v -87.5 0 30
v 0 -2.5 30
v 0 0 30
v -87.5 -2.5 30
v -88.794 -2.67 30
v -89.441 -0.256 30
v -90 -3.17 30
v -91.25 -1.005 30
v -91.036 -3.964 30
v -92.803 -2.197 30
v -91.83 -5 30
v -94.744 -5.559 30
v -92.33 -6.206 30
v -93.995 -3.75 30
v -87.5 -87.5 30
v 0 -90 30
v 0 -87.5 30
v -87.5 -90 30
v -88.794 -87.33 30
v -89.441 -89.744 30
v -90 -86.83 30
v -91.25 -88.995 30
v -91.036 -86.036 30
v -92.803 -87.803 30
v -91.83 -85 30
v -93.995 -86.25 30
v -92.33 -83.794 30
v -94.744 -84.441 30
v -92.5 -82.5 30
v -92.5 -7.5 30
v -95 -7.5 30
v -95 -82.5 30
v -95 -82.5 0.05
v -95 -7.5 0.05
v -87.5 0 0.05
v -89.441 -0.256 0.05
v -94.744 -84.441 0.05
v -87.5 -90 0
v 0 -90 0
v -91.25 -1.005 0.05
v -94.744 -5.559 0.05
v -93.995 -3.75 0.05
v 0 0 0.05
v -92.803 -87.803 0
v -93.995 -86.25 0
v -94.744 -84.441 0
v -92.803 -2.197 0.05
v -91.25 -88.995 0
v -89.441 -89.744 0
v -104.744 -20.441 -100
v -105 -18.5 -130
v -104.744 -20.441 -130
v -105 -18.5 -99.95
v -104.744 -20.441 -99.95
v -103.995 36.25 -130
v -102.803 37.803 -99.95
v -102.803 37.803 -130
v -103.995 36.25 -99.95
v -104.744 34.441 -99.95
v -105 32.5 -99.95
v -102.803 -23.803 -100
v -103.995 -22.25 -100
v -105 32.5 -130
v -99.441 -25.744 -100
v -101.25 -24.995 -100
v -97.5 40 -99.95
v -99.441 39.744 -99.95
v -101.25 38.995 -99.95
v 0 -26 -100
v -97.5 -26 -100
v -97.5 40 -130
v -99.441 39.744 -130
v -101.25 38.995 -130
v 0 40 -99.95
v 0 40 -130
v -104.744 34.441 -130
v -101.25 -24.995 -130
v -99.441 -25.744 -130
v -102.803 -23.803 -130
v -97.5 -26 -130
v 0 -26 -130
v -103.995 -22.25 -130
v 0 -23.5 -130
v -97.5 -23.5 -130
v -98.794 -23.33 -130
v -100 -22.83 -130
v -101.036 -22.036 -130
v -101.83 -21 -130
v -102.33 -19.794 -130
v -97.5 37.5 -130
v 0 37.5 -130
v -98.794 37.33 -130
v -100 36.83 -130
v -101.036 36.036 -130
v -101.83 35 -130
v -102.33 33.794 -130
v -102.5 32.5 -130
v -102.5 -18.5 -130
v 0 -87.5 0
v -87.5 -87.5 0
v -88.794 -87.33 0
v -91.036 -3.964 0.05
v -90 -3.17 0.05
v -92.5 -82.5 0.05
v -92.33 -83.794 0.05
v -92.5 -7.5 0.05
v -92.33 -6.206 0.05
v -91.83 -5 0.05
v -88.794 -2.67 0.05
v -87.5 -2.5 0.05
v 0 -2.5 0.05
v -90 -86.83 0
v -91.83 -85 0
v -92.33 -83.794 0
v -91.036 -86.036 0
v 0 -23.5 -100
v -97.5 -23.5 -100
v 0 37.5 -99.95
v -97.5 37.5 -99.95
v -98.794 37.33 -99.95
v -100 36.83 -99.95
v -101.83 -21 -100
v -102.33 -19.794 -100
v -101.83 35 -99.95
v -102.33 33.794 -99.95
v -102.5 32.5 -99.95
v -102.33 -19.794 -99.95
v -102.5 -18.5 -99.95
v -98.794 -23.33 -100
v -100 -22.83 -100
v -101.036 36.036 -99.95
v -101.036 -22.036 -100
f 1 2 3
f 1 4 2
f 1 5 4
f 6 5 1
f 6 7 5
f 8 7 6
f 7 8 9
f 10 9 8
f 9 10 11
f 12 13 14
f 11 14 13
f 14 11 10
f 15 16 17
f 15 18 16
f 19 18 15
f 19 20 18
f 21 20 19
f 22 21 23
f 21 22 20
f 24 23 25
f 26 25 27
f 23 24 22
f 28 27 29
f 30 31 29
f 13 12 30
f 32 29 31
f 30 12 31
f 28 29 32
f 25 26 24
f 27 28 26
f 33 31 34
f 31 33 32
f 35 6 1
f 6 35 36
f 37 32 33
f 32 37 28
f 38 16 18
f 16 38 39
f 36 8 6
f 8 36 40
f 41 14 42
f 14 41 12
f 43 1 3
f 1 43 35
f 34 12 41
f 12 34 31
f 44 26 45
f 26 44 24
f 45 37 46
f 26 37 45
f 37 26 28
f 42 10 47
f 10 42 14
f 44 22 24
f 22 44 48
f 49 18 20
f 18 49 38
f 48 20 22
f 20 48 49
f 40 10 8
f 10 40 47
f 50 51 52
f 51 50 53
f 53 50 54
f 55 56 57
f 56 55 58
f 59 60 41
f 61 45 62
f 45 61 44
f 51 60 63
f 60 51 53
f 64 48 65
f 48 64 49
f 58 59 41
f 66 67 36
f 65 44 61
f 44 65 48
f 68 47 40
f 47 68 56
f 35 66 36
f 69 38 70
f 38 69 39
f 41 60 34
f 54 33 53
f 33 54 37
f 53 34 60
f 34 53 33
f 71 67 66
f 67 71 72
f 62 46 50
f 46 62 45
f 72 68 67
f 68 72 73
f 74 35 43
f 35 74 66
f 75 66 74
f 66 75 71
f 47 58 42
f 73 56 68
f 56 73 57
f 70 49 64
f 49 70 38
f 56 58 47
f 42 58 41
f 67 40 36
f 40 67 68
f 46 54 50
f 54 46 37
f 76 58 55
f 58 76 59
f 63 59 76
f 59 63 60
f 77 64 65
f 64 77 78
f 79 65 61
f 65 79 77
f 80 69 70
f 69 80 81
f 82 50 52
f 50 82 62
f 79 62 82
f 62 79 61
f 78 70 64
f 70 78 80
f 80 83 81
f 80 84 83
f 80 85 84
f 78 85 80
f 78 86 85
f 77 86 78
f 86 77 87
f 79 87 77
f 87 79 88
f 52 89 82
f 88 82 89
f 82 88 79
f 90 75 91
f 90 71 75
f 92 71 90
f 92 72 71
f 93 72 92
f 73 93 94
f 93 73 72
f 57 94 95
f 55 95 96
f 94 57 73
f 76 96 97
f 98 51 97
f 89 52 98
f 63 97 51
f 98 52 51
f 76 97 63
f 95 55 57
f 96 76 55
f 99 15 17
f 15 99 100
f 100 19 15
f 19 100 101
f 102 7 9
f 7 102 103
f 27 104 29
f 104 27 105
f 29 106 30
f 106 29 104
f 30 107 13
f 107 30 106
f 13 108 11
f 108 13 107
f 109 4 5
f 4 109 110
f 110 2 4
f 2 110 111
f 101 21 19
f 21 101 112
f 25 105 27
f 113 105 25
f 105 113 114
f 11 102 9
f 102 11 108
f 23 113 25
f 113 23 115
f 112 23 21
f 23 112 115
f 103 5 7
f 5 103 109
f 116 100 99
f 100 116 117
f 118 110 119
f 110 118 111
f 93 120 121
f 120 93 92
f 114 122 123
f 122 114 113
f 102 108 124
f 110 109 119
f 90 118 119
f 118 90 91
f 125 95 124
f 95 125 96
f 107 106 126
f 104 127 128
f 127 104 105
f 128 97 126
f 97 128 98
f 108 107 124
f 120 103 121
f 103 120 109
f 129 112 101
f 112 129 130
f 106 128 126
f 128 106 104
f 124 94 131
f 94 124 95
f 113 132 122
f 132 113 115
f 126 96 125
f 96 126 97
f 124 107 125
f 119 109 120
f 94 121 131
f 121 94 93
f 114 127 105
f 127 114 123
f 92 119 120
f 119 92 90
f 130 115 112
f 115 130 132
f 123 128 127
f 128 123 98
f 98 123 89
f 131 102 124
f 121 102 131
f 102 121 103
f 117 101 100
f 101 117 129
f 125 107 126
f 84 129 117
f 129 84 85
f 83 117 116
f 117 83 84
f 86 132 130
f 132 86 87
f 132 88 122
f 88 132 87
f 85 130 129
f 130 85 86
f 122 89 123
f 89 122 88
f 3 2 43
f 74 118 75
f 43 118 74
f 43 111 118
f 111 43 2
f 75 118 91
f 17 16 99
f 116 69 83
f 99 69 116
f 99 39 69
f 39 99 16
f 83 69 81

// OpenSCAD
// file: ../OpenSCAD_Modules/cube_vround.scad
module cube_vround(
	size=[10,10,10],
	round_corners=[true,true,true,true],
	rounding=3,
	center_xy=false,
	center_z=false,
	attach=0,
	wall_attach=0,
	quality=2, //integer from 1 to infinity
)
{
	assert(len(size)==3);
	assert(len(round_corners)==4);
	assert(rounding>0);
	assert(rounding<=size[0]/2);
	assert(rounding<=size[1]/2);
	assert(quality>0);
	assert(attach>=0);
	assert(wall_attach>=0);
	height=size[2]+attach;
	cyl_r=rounding+wall_attach;
	cyl_mvx=size[0]/2-rounding;
	cyl_mvy=size[1]/2-rounding;
	cube_szx=size[0]/2;
	cube_szy=size[1]/2;
	cube_mvx=cube_szx/2+wall_attach;
	cube_mvy=cube_szy/2+wall_attach;
	translate([center_xy?0:cube_szx,center_xy?0:cube_szy,center_z?-attach/2:(size[2]-attach)/2])
		hull()
		{
			if(round_corners[0])
				translate([cyl_mvx,cyl_mvy])
					cylinder(r=cyl_r,h=height,$fn=12*quality,center=true);
			else
				translate([cube_mvx,cube_mvy])
					cube([cube_szx,cube_szy,height],center=true);
			if(round_corners[1])
				translate([cyl_mvx,-cyl_mvy])
					cylinder(r=cyl_r,h=height,$fn=12*quality,center=true);
			else
				translate([cube_mvx,-cube_mvy])
					cube([cube_szx,cube_szy,height],center=true);
			if(round_corners[2])
				translate([-cyl_mvx,-cyl_mvy])
					cylinder(r=cyl_r,h=height,$fn=12*quality,center=true);
			else
				translate([-cube_mvx,-cube_mvy])
					cube([cube_szx,cube_szy,height],center=true);
			if(round_corners[3])
				translate([-cyl_mvx,cyl_mvy])
					cylinder(r=cyl_r,h=height,$fn=12*quality,center=true);
			else
				translate([-cube_mvx,cube_mvy])
					cube([cube_szx,cube_szy,height],center=true);
		};
}

//example
cube_vround(round_corners=[true,false,true,false],
size=[10,20,6],
attach=0.1,
wall_attach=0.1,
rounding=3,
center_xy=true,center_z=false);
// main file
use <../OpenSCAD_Modules/cube_vround.scad>

module Plate
(
	wallSz=2.5,
	backExtSize=[190,90,30],
	interfaceShift=[0,40,100],
	frontExtSize=[204+(2*2.5)+1,60+(2*2.5)+1,30],
	extRounding=5+2.5,
)
{
	cutClr=0.05;
	difference()
	{
		union()
		{
			//back part
			translate([0,-backExtSize[1]/2,0])
			cube_vround(size=[backExtSize[0],backExtSize[1],backExtSize[2]],rounding=extRounding, center_xy=true);

			//interface back (top) to front (bottom)
			hull()
			{
				translate([0,-backExtSize[1]/2,0])
				cube_vround(size=[backExtSize[0],backExtSize[1],cutClr],rounding=extRounding,center_xy=true);

				translate([interfaceShift[0],interfaceShift[1]-frontExtSize[1]/2,-interfaceShift[2]])
				cube_vround(size=[frontExtSize[0],frontExtSize[1],cutClr],rounding=extRounding,center_xy=true);
			}

			//front part
			translate([interfaceShift[0],interfaceShift[1]-frontExtSize[1]/2,-interfaceShift[2]-frontExtSize[2]])
			cube_vround(size=[frontExtSize[0],frontExtSize[1],frontExtSize[2]+cutClr],rounding=extRounding, center_xy=true);
		}

		union()
		{
			//back part
			translate([0,-backExtSize[1]/2,0])
			cube_vround(size=[backExtSize[0]-wallSz*2,backExtSize[1]-wallSz*2,backExtSize[2]+cutClr],rounding=extRounding-wallSz, center_xy=true);

			//interface back (top) to front (bottom)
			hull()
			{
				translate([0,-backExtSize[1]/2,0])
				cube_vround(size=[backExtSize[0]-wallSz*2,backExtSize[1]-wallSz*2,cutClr],rounding=extRounding-wallSz,center_xy=true);

				translate([interfaceShift[0],interfaceShift[1]-frontExtSize[1]/2,-interfaceShift[2]])
				cube_vround(size=[frontExtSize[0]-wallSz*2,frontExtSize[1]-wallSz*2,cutClr],rounding=extRounding-wallSz,center_xy=true);
			}

			//front part
			translate([interfaceShift[0],interfaceShift[1]-frontExtSize[1]/2,-interfaceShift[2]-frontExtSize[2]-cutClr])
			cube_vround(size=[frontExtSize[0]-wallSz*2,frontExtSize[1]-wallSz*2,frontExtSize[2]+2*cutClr],rounding=extRounding-wallSz, center_xy=true);
		}
	}
}

module PlateHalf
(
	top=false,
	wallSz=2.5,
	backExtSize=[190,90,30],
	interfaceShift=[0,40,100],
	frontExtSize=[204+(2*2.5)+1,60+(2*2.5)+1,30],
	extRounding=5+2.5,
)
{
	i=top?1:0;
	translate([-500*i,-250,-250])
	cube(size=[500,500,500], center=false);
}

difference()
{
	Plate();
	PlateHalf(top=false);
}
